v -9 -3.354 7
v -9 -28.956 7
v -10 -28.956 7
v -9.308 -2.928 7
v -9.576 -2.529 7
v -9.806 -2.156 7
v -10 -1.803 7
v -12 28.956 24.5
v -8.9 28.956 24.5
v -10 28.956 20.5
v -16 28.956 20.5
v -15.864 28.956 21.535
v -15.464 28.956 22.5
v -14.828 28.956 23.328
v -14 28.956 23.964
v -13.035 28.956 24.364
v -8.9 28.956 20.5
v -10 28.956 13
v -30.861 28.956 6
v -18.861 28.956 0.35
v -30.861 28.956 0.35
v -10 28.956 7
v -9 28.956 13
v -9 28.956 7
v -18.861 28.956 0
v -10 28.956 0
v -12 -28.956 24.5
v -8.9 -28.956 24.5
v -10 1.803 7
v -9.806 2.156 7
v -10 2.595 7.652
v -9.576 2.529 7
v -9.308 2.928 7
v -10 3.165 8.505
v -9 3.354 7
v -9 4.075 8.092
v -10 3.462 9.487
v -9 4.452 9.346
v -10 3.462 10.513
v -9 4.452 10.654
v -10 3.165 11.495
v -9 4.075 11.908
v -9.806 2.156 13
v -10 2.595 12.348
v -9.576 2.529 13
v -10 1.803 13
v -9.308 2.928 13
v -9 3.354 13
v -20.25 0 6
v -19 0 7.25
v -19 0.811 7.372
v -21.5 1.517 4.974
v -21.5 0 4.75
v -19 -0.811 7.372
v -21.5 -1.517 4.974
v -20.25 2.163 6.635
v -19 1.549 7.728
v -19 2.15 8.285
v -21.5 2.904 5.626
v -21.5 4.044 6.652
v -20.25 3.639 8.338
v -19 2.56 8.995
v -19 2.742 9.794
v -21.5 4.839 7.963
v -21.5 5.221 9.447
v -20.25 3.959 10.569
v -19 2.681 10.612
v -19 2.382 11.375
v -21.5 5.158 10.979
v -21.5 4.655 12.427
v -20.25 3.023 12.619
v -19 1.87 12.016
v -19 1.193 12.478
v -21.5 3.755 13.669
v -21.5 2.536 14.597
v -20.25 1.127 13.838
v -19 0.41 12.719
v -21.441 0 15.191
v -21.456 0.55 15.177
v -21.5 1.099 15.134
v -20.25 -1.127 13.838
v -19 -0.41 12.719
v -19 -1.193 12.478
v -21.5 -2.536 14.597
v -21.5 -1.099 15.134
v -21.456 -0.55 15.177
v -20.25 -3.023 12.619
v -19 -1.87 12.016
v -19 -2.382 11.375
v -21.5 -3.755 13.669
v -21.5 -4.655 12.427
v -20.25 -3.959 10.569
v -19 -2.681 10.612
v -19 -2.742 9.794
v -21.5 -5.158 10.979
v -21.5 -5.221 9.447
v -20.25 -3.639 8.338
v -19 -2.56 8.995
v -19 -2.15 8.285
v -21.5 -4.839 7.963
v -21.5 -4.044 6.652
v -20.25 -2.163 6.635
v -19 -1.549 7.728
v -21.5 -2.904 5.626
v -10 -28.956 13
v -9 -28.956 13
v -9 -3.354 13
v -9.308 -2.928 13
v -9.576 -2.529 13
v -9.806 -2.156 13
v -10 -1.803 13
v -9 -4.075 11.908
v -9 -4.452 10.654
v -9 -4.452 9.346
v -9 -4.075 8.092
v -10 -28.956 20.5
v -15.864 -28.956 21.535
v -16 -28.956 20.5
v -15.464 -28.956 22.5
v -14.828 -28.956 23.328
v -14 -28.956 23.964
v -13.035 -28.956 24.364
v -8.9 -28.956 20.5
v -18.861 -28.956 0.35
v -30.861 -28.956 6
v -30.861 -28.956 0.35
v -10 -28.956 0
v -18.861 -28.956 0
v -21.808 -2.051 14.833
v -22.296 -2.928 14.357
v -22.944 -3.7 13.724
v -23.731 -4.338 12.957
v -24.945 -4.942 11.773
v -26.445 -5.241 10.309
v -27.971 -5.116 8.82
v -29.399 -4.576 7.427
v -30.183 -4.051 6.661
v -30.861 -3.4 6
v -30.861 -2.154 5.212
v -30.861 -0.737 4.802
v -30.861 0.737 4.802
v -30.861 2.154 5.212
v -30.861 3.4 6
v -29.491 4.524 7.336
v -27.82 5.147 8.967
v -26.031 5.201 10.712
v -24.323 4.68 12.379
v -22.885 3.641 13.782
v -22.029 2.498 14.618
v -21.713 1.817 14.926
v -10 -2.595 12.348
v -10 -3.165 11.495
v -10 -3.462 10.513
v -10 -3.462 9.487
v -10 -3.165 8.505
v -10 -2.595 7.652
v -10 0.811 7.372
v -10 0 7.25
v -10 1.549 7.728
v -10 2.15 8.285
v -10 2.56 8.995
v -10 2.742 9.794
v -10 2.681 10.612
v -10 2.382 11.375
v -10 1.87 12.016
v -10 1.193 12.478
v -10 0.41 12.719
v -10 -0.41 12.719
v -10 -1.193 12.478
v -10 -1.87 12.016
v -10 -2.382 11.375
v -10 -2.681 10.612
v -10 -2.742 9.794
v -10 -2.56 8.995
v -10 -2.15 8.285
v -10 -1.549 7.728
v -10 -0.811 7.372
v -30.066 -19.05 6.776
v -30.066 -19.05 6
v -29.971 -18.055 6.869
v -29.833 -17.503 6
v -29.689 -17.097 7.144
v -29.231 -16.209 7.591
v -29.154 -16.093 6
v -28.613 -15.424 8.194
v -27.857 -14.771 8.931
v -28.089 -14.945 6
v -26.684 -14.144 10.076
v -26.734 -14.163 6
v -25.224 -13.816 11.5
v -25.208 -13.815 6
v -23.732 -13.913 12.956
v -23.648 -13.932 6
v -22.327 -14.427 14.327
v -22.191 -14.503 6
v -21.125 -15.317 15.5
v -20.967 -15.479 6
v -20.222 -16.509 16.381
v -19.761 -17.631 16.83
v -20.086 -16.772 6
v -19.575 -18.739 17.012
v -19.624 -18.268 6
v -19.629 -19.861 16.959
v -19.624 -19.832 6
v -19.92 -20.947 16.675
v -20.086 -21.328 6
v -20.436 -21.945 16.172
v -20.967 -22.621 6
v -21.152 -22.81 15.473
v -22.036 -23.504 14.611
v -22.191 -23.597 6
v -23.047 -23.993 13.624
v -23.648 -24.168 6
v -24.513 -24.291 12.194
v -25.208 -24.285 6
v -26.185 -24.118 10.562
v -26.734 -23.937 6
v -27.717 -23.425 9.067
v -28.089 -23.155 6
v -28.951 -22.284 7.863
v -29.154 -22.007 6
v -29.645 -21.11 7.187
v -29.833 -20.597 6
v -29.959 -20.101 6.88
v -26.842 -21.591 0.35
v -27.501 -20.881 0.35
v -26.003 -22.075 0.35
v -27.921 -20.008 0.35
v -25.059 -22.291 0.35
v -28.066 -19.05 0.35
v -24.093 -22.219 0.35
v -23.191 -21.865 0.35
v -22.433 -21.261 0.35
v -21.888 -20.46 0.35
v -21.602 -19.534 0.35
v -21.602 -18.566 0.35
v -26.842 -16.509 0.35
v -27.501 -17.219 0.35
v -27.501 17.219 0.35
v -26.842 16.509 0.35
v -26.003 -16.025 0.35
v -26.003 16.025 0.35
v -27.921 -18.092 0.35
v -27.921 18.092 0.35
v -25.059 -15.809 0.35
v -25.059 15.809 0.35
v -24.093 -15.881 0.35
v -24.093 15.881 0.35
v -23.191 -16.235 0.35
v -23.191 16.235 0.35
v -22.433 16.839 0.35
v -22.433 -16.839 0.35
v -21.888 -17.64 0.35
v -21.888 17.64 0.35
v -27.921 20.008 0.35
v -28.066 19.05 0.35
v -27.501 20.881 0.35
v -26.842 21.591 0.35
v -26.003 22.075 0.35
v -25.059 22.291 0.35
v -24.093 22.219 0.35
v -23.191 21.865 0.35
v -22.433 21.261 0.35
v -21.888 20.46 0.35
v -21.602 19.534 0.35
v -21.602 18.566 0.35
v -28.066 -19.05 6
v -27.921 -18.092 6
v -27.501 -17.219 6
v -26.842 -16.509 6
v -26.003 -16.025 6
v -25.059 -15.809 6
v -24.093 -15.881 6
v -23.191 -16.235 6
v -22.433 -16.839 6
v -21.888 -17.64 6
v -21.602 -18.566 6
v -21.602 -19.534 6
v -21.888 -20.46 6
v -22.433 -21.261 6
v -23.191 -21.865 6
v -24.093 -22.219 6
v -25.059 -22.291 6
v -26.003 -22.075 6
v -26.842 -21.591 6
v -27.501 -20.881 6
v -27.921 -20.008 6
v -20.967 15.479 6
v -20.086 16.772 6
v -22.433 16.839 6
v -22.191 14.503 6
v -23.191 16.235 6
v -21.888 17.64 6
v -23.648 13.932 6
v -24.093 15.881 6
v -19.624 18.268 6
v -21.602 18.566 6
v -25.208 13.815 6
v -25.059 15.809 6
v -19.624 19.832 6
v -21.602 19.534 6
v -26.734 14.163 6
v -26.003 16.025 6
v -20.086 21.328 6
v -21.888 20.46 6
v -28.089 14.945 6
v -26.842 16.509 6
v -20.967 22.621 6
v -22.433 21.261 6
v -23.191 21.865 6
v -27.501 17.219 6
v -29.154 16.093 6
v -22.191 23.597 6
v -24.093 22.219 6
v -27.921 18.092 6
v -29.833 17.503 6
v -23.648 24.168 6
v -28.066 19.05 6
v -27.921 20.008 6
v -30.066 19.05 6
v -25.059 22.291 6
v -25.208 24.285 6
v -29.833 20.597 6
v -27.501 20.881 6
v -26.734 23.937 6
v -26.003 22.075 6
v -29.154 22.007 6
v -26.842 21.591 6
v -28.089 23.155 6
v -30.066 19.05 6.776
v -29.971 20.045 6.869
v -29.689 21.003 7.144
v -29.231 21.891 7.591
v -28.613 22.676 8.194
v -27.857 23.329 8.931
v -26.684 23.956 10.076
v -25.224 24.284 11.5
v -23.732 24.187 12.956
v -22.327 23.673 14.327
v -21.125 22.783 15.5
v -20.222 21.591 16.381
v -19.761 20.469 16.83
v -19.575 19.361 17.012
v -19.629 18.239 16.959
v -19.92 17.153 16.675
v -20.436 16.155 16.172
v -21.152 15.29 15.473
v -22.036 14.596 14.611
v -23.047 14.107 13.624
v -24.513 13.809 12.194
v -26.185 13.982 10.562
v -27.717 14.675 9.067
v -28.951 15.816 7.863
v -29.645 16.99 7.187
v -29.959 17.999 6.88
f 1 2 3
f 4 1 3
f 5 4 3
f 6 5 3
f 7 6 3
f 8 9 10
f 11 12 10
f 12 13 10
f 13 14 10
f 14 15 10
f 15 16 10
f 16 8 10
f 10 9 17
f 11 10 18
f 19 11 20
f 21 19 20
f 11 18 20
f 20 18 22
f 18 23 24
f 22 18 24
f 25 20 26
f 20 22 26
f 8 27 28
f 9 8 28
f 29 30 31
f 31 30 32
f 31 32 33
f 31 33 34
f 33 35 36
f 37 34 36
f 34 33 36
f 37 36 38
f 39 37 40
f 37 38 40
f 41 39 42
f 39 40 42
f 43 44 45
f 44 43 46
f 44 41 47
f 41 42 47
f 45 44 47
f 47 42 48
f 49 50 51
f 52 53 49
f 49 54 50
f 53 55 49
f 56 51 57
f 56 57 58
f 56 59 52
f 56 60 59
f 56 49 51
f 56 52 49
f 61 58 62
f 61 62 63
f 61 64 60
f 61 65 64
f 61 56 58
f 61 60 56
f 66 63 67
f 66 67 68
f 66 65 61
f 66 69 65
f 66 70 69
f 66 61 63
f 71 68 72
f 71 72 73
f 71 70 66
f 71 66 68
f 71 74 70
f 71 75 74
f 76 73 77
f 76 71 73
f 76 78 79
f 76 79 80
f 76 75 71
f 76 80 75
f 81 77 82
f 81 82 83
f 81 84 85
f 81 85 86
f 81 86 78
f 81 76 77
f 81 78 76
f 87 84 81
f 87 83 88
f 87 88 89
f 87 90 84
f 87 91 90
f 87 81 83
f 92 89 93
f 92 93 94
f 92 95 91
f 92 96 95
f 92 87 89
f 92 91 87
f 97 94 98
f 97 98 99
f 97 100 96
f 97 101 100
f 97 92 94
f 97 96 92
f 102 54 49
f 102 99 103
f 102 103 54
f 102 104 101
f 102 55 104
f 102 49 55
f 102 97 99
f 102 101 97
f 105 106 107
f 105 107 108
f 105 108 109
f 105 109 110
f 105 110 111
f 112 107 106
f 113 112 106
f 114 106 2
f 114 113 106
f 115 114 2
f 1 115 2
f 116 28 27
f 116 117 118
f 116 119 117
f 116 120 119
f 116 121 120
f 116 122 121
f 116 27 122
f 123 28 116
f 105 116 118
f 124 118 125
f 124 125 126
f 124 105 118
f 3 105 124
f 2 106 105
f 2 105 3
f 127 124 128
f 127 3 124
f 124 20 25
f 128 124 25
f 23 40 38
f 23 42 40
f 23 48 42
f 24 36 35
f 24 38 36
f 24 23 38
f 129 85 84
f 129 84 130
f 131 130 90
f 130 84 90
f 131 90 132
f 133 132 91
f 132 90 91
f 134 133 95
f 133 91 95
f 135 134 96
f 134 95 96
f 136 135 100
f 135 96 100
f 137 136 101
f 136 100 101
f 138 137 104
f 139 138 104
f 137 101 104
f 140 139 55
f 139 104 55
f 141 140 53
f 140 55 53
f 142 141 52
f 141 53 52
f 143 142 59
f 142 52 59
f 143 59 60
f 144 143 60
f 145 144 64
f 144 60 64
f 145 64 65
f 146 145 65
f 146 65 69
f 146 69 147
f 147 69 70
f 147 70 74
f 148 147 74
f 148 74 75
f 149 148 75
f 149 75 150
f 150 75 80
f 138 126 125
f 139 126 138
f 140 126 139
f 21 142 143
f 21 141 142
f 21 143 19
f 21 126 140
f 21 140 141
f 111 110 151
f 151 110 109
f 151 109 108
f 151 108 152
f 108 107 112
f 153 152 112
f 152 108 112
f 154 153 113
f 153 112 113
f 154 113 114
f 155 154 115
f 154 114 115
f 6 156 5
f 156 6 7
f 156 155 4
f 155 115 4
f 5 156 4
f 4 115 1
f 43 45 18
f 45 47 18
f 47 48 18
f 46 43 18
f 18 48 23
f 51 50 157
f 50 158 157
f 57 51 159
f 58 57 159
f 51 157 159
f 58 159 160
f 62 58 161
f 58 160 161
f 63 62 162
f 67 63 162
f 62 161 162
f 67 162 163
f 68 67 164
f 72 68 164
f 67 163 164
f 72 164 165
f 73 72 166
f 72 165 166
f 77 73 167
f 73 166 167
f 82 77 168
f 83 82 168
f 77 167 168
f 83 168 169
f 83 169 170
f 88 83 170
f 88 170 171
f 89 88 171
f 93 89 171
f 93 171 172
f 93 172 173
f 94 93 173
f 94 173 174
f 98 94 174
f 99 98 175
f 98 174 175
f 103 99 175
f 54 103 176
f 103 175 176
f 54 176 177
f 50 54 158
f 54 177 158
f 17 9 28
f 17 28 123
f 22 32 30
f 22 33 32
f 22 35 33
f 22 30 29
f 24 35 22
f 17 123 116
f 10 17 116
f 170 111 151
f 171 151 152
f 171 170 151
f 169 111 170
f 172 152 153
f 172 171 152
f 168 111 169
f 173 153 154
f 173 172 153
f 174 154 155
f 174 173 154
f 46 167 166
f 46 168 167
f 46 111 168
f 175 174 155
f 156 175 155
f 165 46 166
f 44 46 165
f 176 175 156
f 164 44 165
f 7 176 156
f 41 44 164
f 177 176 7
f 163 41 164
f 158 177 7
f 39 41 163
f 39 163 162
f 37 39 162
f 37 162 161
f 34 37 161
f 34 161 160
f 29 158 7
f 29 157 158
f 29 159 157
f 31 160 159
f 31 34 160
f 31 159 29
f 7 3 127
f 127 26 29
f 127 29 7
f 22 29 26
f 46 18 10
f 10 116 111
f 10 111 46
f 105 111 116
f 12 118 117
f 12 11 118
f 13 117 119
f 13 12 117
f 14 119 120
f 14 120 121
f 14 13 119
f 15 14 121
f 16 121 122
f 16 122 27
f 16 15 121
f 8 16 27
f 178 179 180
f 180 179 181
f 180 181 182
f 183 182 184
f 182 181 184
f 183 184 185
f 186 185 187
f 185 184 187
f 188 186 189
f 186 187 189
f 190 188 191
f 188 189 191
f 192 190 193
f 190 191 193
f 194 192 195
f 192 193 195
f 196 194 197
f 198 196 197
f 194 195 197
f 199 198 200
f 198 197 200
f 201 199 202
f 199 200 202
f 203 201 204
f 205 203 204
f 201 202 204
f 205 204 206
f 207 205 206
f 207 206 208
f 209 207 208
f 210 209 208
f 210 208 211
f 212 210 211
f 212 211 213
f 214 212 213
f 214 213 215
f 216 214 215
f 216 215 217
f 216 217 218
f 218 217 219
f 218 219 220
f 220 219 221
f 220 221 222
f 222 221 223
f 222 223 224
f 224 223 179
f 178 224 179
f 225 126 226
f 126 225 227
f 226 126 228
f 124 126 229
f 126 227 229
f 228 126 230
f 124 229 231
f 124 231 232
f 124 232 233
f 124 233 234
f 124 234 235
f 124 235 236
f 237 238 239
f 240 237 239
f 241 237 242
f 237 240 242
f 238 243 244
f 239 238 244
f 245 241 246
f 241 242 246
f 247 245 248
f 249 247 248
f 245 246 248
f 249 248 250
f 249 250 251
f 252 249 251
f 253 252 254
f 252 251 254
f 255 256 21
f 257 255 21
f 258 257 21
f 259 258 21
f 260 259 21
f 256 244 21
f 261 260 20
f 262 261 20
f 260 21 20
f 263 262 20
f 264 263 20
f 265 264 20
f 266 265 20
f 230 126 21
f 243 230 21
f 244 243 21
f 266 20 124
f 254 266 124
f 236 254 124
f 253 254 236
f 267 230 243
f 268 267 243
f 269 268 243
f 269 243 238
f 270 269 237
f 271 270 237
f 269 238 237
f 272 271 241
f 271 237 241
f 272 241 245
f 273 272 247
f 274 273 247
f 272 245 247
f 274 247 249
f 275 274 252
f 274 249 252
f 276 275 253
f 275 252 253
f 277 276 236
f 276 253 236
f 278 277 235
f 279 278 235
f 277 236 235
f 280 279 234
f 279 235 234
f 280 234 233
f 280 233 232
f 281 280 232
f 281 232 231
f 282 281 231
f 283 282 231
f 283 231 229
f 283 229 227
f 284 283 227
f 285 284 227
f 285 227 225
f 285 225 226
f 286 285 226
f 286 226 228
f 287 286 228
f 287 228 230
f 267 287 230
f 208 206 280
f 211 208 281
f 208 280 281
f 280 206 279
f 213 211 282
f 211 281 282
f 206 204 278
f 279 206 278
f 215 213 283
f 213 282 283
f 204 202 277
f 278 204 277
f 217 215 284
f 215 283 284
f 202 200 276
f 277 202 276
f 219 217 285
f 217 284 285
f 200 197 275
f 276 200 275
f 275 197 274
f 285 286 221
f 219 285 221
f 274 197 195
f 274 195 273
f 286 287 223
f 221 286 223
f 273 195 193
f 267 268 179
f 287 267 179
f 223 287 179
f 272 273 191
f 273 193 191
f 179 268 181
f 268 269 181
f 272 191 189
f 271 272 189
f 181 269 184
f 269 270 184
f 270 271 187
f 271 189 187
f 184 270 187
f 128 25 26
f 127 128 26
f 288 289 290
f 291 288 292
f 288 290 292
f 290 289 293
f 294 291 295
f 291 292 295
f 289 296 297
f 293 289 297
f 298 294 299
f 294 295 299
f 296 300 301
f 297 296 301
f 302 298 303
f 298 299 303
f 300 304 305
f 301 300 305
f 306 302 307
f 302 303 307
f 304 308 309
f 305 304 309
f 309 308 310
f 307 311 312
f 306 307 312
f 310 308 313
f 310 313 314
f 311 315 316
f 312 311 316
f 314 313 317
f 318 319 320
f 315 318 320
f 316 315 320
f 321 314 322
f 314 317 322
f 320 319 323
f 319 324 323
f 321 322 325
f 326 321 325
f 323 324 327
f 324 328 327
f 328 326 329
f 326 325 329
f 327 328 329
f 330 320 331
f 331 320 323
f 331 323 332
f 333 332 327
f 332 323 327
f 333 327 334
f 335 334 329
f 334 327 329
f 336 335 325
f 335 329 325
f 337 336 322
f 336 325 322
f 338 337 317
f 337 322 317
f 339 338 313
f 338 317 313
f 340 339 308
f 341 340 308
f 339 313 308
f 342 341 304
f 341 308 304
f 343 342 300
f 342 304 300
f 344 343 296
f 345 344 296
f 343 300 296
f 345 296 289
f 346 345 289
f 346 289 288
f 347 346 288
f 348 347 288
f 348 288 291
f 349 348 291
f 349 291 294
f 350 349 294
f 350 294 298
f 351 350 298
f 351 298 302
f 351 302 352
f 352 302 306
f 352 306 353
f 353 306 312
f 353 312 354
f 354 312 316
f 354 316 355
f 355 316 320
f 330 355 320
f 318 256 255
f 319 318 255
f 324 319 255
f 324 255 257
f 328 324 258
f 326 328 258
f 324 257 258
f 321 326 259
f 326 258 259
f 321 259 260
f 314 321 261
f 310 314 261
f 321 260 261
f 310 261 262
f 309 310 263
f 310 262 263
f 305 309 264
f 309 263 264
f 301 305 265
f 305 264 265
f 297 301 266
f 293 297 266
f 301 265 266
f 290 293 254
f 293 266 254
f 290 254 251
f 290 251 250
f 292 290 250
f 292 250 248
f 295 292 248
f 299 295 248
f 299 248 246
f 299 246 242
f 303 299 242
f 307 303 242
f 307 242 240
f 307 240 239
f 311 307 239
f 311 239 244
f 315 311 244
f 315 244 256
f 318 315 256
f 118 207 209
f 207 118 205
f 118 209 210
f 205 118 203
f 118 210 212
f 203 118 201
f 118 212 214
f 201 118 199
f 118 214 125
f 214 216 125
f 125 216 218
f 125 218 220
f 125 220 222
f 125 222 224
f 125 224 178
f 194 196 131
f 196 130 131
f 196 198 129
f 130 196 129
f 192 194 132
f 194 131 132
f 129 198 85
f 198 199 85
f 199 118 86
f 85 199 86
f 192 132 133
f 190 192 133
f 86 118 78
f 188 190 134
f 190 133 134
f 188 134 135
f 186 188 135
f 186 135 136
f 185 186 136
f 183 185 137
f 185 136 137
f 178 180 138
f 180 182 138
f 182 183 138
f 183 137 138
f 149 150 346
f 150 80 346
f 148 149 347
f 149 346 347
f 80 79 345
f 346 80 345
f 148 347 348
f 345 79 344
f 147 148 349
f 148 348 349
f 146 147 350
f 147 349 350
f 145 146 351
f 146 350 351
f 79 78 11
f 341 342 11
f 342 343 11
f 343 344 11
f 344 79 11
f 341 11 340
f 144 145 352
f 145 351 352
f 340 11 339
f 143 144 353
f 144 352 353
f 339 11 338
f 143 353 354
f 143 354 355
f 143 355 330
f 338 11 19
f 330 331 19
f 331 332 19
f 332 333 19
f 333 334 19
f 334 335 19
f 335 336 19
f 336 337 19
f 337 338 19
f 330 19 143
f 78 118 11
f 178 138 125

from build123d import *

# Parameters (mm, degrees)
SKETCH1_W           = 20.861
SKETCH1_H           = 57.912
SKETCH1_R           = 3.25
BOSS_EXTRUDE1_DEPTH = 6
BOSS_EXTRUDE2_DEPTH = 57.912
SKETCH8_R           = 3.25
CUT_EXTRUDE4_DEPTH  = 49.898888096
CUT_EXTRUDE5_START  = -6
SKETCH9_R           = 5.25
CUT_EXTRUDE5_DEPTH  = 43.898888096
SKETCH10_R          = 2.75
CUT_EXTRUDE6_DEPTH  = 44.28835013
CUT_EXTRUDE7_START  = -9
SKETCH11_R          = 5.25
CUT_EXTRUDE7_DEPTH  = 35.28835013
SKETCH12_W          = 12
SKETCH12_H          = 0.35
CUT_EXTRUDE8_DEPTH  = 71.046063879
FILLET1_R           = 4
BOSS_EXTRUDE3_START = 1
SKETCH13_W          = 6
SKETCH13_H          = 57.912
SKETCH13_R          = 2.75
BOSS_EXTRUDE3_DEPTH = 1
CHAMFER1_SIZE       = 2.5
SKETCH14_R          = 3.5
CUT_EXTRUDE9_DEPTH  = 1
CHAMFER2_SIZE       = 1


# Some blends are built 0.0001 mm under size
with BuildPart() as part:
    # Sketch1 → Boss-Extrude1 (new body)
    # profile 1 of 3: a face of its own
    with BuildSketch(Plane.XY):
        with Locations((-20.4305, 0)):
            Rectangle(SKETCH1_W, SKETCH1_H)
        with Locations((-24.8158, 19.05)):
            Circle(SKETCH1_R, mode=Mode.SUBTRACT)
        with Locations((-24.8158, -19.05)):
            Circle(SKETCH1_R, mode=Mode.SUBTRACT)
    # profile 2 of 3: a face of its own
    with BuildSketch(Plane.XY):
        with Locations((-24.8158, 19.05)):
            Circle(SKETCH1_R)
    # profile 3 of 3: a face of its own
    with BuildSketch(Plane.XY):
        with Locations((-24.8158, -19.05)):
            Circle(SKETCH1_R)
    extrude(amount=BOSS_EXTRUDE1_DEPTH)

    # Sketch7 → Boss-Extrude2 (add)
    with BuildSketch(Plane.XZ.offset(28.956)):
        Polygon((-30.861, 6), (-16, 20.5), (-16, 24.5), (-8.9, 24.5), (-8.9, 20.5), (-10, 20.5), (-10, 6), align=None)
    extrude(amount=-BOSS_EXTRUDE2_DEPTH)

    # Sketch8 → Cut-Extrude4 (cut, through all)
    with BuildSketch(Plane(origin=(0, 0, 0), x_dir=(-1, 0, 0), z_dir=(0, 0, -1))):
        with Locations((24.8158, -19.05)):
            Circle(SKETCH8_R)
        with Locations((24.8158, 19.05)):
            Circle(SKETCH8_R)
    extrude(amount=-CUT_EXTRUDE4_DEPTH, mode=Mode.SUBTRACT)

    # Sketch9 → Cut-Extrude5 (cut, through all)
    with BuildSketch(Plane(origin=(0, 0, 0), x_dir=(-1, 0, 0), z_dir=(0, 0, -1)).offset(CUT_EXTRUDE5_START)):
        with Locations((24.8158, -19.05)):
            Circle(SKETCH9_R)
        with Locations((24.8158, 19.05)):
            Circle(SKETCH9_R)
    extrude(amount=-CUT_EXTRUDE5_DEPTH, mode=Mode.SUBTRACT)

    # Sketch10 → Cut-Extrude6 (cut, through all)
    with BuildSketch(Plane(origin=(-10, 0, 0), x_dir=(0, 0, -1), z_dir=(1, 0, 0))):
        with Locations((-10, 0)):
            Circle(SKETCH10_R)
    extrude(amount=-CUT_EXTRUDE6_DEPTH, mode=Mode.SUBTRACT)

    # Sketch11 → Cut-Extrude7 (cut, through all)
    with BuildSketch(Plane(origin=(-10, 0, 0), x_dir=(0, 0, -1), z_dir=(1, 0, 0)).offset(CUT_EXTRUDE7_START)):
        with Locations((-10, 0)):
            Circle(SKETCH11_R)
    extrude(amount=-CUT_EXTRUDE7_DEPTH, mode=Mode.SUBTRACT)

    # Sketch12 → Cut-Extrude8 (cut, through all)
    with BuildSketch(Plane(origin=(0, 28.956, 0), x_dir=(1, 0, 0), z_dir=(0, 1, 0))):
        with Locations((-24.861, -0.175)):
            Rectangle(SKETCH12_W, SKETCH12_H)
    extrude(amount=-CUT_EXTRUDE8_DEPTH, mode=Mode.SUBTRACT)

    # Fillet1
    fillet1_edges = [part.edges().sort_by_distance(p)[0] for p in [
        (-16, 0, 24.5),
    ]]
    fillet(fillet1_edges, radius=FILLET1_R - 0.0001)  # a hair under: the kernel refuses the full size

    # Sketch13 → Boss-Extrude3 (add)
    with BuildSketch(Plane(origin=(-10, 0, 0), x_dir=(0, 0, -1), z_dir=(1, 0, 0)).offset(BOSS_EXTRUDE3_START)):
        with Locations((-10, 0)):
            Rectangle(SKETCH13_W, SKETCH13_H)
        with Locations((-10, 0)):
            Circle(SKETCH13_R, mode=Mode.SUBTRACT)
    extrude(amount=-BOSS_EXTRUDE3_DEPTH)

    # Chamfer1
    # the kernel refuses this chamfer: 2.5 mm, written as the material it adds along each edge
    with BuildSketch(Plane(origin=(-19, 0, 10), x_dir=(0, 0, -1), z_dir=(0, -1, 0))) as chamfer1_piece_1_section:
        Polygon((5.25 - CHAMFER1_SIZE, 0), (5.25, -CHAMFER1_SIZE), (5.25, 0), align=None)
    chamfer1_piece_1 = revolve(axis=Axis((-19, 0, 10), (1, 0, 0)), mode=Mode.PRIVATE)
    chamfer1_piece_1 = chamfer1_piece_1 - Plane(origin=(-20.253037954, 0, 10), x_dir=(0, 0, -1), z_dir=(1, 0, 0)) * Cylinder(2.75, 21, mode=Mode.PRIVATE)
    chamfer1_piece_1 = split(chamfer1_piece_1, bisect_by=Plane(origin=(-21.393994511, 0, 15.237035166), z_dir=(0.6983599622441906, 0, -0.7157467171662703)), keep=Keep.TOP, mode=Mode.PRIVATE)
    add(chamfer1_piece_1)

    # Sketch14 → Cut-Extrude9 (cut)
    with BuildSketch(Plane(origin=(-9, 0, 0), x_dir=(0, 0, -1), z_dir=(1, 0, 0))):
        with Locations((-10, 0)):
            Circle(SKETCH14_R)
    extrude(amount=-CUT_EXTRUDE9_DEPTH, mode=Mode.SUBTRACT)

    # Chamfer2
    chamfer2_edges = [part.edges().sort_by_distance(p)[0] for p in [
        (-9, -3.5, 10),
        (-9, 3.5, 10),
    ]]
    chamfer(chamfer2_edges, length=CHAMFER2_SIZE - 0.0001)  # a hair under: the kernel refuses the full size


solid = part.part
